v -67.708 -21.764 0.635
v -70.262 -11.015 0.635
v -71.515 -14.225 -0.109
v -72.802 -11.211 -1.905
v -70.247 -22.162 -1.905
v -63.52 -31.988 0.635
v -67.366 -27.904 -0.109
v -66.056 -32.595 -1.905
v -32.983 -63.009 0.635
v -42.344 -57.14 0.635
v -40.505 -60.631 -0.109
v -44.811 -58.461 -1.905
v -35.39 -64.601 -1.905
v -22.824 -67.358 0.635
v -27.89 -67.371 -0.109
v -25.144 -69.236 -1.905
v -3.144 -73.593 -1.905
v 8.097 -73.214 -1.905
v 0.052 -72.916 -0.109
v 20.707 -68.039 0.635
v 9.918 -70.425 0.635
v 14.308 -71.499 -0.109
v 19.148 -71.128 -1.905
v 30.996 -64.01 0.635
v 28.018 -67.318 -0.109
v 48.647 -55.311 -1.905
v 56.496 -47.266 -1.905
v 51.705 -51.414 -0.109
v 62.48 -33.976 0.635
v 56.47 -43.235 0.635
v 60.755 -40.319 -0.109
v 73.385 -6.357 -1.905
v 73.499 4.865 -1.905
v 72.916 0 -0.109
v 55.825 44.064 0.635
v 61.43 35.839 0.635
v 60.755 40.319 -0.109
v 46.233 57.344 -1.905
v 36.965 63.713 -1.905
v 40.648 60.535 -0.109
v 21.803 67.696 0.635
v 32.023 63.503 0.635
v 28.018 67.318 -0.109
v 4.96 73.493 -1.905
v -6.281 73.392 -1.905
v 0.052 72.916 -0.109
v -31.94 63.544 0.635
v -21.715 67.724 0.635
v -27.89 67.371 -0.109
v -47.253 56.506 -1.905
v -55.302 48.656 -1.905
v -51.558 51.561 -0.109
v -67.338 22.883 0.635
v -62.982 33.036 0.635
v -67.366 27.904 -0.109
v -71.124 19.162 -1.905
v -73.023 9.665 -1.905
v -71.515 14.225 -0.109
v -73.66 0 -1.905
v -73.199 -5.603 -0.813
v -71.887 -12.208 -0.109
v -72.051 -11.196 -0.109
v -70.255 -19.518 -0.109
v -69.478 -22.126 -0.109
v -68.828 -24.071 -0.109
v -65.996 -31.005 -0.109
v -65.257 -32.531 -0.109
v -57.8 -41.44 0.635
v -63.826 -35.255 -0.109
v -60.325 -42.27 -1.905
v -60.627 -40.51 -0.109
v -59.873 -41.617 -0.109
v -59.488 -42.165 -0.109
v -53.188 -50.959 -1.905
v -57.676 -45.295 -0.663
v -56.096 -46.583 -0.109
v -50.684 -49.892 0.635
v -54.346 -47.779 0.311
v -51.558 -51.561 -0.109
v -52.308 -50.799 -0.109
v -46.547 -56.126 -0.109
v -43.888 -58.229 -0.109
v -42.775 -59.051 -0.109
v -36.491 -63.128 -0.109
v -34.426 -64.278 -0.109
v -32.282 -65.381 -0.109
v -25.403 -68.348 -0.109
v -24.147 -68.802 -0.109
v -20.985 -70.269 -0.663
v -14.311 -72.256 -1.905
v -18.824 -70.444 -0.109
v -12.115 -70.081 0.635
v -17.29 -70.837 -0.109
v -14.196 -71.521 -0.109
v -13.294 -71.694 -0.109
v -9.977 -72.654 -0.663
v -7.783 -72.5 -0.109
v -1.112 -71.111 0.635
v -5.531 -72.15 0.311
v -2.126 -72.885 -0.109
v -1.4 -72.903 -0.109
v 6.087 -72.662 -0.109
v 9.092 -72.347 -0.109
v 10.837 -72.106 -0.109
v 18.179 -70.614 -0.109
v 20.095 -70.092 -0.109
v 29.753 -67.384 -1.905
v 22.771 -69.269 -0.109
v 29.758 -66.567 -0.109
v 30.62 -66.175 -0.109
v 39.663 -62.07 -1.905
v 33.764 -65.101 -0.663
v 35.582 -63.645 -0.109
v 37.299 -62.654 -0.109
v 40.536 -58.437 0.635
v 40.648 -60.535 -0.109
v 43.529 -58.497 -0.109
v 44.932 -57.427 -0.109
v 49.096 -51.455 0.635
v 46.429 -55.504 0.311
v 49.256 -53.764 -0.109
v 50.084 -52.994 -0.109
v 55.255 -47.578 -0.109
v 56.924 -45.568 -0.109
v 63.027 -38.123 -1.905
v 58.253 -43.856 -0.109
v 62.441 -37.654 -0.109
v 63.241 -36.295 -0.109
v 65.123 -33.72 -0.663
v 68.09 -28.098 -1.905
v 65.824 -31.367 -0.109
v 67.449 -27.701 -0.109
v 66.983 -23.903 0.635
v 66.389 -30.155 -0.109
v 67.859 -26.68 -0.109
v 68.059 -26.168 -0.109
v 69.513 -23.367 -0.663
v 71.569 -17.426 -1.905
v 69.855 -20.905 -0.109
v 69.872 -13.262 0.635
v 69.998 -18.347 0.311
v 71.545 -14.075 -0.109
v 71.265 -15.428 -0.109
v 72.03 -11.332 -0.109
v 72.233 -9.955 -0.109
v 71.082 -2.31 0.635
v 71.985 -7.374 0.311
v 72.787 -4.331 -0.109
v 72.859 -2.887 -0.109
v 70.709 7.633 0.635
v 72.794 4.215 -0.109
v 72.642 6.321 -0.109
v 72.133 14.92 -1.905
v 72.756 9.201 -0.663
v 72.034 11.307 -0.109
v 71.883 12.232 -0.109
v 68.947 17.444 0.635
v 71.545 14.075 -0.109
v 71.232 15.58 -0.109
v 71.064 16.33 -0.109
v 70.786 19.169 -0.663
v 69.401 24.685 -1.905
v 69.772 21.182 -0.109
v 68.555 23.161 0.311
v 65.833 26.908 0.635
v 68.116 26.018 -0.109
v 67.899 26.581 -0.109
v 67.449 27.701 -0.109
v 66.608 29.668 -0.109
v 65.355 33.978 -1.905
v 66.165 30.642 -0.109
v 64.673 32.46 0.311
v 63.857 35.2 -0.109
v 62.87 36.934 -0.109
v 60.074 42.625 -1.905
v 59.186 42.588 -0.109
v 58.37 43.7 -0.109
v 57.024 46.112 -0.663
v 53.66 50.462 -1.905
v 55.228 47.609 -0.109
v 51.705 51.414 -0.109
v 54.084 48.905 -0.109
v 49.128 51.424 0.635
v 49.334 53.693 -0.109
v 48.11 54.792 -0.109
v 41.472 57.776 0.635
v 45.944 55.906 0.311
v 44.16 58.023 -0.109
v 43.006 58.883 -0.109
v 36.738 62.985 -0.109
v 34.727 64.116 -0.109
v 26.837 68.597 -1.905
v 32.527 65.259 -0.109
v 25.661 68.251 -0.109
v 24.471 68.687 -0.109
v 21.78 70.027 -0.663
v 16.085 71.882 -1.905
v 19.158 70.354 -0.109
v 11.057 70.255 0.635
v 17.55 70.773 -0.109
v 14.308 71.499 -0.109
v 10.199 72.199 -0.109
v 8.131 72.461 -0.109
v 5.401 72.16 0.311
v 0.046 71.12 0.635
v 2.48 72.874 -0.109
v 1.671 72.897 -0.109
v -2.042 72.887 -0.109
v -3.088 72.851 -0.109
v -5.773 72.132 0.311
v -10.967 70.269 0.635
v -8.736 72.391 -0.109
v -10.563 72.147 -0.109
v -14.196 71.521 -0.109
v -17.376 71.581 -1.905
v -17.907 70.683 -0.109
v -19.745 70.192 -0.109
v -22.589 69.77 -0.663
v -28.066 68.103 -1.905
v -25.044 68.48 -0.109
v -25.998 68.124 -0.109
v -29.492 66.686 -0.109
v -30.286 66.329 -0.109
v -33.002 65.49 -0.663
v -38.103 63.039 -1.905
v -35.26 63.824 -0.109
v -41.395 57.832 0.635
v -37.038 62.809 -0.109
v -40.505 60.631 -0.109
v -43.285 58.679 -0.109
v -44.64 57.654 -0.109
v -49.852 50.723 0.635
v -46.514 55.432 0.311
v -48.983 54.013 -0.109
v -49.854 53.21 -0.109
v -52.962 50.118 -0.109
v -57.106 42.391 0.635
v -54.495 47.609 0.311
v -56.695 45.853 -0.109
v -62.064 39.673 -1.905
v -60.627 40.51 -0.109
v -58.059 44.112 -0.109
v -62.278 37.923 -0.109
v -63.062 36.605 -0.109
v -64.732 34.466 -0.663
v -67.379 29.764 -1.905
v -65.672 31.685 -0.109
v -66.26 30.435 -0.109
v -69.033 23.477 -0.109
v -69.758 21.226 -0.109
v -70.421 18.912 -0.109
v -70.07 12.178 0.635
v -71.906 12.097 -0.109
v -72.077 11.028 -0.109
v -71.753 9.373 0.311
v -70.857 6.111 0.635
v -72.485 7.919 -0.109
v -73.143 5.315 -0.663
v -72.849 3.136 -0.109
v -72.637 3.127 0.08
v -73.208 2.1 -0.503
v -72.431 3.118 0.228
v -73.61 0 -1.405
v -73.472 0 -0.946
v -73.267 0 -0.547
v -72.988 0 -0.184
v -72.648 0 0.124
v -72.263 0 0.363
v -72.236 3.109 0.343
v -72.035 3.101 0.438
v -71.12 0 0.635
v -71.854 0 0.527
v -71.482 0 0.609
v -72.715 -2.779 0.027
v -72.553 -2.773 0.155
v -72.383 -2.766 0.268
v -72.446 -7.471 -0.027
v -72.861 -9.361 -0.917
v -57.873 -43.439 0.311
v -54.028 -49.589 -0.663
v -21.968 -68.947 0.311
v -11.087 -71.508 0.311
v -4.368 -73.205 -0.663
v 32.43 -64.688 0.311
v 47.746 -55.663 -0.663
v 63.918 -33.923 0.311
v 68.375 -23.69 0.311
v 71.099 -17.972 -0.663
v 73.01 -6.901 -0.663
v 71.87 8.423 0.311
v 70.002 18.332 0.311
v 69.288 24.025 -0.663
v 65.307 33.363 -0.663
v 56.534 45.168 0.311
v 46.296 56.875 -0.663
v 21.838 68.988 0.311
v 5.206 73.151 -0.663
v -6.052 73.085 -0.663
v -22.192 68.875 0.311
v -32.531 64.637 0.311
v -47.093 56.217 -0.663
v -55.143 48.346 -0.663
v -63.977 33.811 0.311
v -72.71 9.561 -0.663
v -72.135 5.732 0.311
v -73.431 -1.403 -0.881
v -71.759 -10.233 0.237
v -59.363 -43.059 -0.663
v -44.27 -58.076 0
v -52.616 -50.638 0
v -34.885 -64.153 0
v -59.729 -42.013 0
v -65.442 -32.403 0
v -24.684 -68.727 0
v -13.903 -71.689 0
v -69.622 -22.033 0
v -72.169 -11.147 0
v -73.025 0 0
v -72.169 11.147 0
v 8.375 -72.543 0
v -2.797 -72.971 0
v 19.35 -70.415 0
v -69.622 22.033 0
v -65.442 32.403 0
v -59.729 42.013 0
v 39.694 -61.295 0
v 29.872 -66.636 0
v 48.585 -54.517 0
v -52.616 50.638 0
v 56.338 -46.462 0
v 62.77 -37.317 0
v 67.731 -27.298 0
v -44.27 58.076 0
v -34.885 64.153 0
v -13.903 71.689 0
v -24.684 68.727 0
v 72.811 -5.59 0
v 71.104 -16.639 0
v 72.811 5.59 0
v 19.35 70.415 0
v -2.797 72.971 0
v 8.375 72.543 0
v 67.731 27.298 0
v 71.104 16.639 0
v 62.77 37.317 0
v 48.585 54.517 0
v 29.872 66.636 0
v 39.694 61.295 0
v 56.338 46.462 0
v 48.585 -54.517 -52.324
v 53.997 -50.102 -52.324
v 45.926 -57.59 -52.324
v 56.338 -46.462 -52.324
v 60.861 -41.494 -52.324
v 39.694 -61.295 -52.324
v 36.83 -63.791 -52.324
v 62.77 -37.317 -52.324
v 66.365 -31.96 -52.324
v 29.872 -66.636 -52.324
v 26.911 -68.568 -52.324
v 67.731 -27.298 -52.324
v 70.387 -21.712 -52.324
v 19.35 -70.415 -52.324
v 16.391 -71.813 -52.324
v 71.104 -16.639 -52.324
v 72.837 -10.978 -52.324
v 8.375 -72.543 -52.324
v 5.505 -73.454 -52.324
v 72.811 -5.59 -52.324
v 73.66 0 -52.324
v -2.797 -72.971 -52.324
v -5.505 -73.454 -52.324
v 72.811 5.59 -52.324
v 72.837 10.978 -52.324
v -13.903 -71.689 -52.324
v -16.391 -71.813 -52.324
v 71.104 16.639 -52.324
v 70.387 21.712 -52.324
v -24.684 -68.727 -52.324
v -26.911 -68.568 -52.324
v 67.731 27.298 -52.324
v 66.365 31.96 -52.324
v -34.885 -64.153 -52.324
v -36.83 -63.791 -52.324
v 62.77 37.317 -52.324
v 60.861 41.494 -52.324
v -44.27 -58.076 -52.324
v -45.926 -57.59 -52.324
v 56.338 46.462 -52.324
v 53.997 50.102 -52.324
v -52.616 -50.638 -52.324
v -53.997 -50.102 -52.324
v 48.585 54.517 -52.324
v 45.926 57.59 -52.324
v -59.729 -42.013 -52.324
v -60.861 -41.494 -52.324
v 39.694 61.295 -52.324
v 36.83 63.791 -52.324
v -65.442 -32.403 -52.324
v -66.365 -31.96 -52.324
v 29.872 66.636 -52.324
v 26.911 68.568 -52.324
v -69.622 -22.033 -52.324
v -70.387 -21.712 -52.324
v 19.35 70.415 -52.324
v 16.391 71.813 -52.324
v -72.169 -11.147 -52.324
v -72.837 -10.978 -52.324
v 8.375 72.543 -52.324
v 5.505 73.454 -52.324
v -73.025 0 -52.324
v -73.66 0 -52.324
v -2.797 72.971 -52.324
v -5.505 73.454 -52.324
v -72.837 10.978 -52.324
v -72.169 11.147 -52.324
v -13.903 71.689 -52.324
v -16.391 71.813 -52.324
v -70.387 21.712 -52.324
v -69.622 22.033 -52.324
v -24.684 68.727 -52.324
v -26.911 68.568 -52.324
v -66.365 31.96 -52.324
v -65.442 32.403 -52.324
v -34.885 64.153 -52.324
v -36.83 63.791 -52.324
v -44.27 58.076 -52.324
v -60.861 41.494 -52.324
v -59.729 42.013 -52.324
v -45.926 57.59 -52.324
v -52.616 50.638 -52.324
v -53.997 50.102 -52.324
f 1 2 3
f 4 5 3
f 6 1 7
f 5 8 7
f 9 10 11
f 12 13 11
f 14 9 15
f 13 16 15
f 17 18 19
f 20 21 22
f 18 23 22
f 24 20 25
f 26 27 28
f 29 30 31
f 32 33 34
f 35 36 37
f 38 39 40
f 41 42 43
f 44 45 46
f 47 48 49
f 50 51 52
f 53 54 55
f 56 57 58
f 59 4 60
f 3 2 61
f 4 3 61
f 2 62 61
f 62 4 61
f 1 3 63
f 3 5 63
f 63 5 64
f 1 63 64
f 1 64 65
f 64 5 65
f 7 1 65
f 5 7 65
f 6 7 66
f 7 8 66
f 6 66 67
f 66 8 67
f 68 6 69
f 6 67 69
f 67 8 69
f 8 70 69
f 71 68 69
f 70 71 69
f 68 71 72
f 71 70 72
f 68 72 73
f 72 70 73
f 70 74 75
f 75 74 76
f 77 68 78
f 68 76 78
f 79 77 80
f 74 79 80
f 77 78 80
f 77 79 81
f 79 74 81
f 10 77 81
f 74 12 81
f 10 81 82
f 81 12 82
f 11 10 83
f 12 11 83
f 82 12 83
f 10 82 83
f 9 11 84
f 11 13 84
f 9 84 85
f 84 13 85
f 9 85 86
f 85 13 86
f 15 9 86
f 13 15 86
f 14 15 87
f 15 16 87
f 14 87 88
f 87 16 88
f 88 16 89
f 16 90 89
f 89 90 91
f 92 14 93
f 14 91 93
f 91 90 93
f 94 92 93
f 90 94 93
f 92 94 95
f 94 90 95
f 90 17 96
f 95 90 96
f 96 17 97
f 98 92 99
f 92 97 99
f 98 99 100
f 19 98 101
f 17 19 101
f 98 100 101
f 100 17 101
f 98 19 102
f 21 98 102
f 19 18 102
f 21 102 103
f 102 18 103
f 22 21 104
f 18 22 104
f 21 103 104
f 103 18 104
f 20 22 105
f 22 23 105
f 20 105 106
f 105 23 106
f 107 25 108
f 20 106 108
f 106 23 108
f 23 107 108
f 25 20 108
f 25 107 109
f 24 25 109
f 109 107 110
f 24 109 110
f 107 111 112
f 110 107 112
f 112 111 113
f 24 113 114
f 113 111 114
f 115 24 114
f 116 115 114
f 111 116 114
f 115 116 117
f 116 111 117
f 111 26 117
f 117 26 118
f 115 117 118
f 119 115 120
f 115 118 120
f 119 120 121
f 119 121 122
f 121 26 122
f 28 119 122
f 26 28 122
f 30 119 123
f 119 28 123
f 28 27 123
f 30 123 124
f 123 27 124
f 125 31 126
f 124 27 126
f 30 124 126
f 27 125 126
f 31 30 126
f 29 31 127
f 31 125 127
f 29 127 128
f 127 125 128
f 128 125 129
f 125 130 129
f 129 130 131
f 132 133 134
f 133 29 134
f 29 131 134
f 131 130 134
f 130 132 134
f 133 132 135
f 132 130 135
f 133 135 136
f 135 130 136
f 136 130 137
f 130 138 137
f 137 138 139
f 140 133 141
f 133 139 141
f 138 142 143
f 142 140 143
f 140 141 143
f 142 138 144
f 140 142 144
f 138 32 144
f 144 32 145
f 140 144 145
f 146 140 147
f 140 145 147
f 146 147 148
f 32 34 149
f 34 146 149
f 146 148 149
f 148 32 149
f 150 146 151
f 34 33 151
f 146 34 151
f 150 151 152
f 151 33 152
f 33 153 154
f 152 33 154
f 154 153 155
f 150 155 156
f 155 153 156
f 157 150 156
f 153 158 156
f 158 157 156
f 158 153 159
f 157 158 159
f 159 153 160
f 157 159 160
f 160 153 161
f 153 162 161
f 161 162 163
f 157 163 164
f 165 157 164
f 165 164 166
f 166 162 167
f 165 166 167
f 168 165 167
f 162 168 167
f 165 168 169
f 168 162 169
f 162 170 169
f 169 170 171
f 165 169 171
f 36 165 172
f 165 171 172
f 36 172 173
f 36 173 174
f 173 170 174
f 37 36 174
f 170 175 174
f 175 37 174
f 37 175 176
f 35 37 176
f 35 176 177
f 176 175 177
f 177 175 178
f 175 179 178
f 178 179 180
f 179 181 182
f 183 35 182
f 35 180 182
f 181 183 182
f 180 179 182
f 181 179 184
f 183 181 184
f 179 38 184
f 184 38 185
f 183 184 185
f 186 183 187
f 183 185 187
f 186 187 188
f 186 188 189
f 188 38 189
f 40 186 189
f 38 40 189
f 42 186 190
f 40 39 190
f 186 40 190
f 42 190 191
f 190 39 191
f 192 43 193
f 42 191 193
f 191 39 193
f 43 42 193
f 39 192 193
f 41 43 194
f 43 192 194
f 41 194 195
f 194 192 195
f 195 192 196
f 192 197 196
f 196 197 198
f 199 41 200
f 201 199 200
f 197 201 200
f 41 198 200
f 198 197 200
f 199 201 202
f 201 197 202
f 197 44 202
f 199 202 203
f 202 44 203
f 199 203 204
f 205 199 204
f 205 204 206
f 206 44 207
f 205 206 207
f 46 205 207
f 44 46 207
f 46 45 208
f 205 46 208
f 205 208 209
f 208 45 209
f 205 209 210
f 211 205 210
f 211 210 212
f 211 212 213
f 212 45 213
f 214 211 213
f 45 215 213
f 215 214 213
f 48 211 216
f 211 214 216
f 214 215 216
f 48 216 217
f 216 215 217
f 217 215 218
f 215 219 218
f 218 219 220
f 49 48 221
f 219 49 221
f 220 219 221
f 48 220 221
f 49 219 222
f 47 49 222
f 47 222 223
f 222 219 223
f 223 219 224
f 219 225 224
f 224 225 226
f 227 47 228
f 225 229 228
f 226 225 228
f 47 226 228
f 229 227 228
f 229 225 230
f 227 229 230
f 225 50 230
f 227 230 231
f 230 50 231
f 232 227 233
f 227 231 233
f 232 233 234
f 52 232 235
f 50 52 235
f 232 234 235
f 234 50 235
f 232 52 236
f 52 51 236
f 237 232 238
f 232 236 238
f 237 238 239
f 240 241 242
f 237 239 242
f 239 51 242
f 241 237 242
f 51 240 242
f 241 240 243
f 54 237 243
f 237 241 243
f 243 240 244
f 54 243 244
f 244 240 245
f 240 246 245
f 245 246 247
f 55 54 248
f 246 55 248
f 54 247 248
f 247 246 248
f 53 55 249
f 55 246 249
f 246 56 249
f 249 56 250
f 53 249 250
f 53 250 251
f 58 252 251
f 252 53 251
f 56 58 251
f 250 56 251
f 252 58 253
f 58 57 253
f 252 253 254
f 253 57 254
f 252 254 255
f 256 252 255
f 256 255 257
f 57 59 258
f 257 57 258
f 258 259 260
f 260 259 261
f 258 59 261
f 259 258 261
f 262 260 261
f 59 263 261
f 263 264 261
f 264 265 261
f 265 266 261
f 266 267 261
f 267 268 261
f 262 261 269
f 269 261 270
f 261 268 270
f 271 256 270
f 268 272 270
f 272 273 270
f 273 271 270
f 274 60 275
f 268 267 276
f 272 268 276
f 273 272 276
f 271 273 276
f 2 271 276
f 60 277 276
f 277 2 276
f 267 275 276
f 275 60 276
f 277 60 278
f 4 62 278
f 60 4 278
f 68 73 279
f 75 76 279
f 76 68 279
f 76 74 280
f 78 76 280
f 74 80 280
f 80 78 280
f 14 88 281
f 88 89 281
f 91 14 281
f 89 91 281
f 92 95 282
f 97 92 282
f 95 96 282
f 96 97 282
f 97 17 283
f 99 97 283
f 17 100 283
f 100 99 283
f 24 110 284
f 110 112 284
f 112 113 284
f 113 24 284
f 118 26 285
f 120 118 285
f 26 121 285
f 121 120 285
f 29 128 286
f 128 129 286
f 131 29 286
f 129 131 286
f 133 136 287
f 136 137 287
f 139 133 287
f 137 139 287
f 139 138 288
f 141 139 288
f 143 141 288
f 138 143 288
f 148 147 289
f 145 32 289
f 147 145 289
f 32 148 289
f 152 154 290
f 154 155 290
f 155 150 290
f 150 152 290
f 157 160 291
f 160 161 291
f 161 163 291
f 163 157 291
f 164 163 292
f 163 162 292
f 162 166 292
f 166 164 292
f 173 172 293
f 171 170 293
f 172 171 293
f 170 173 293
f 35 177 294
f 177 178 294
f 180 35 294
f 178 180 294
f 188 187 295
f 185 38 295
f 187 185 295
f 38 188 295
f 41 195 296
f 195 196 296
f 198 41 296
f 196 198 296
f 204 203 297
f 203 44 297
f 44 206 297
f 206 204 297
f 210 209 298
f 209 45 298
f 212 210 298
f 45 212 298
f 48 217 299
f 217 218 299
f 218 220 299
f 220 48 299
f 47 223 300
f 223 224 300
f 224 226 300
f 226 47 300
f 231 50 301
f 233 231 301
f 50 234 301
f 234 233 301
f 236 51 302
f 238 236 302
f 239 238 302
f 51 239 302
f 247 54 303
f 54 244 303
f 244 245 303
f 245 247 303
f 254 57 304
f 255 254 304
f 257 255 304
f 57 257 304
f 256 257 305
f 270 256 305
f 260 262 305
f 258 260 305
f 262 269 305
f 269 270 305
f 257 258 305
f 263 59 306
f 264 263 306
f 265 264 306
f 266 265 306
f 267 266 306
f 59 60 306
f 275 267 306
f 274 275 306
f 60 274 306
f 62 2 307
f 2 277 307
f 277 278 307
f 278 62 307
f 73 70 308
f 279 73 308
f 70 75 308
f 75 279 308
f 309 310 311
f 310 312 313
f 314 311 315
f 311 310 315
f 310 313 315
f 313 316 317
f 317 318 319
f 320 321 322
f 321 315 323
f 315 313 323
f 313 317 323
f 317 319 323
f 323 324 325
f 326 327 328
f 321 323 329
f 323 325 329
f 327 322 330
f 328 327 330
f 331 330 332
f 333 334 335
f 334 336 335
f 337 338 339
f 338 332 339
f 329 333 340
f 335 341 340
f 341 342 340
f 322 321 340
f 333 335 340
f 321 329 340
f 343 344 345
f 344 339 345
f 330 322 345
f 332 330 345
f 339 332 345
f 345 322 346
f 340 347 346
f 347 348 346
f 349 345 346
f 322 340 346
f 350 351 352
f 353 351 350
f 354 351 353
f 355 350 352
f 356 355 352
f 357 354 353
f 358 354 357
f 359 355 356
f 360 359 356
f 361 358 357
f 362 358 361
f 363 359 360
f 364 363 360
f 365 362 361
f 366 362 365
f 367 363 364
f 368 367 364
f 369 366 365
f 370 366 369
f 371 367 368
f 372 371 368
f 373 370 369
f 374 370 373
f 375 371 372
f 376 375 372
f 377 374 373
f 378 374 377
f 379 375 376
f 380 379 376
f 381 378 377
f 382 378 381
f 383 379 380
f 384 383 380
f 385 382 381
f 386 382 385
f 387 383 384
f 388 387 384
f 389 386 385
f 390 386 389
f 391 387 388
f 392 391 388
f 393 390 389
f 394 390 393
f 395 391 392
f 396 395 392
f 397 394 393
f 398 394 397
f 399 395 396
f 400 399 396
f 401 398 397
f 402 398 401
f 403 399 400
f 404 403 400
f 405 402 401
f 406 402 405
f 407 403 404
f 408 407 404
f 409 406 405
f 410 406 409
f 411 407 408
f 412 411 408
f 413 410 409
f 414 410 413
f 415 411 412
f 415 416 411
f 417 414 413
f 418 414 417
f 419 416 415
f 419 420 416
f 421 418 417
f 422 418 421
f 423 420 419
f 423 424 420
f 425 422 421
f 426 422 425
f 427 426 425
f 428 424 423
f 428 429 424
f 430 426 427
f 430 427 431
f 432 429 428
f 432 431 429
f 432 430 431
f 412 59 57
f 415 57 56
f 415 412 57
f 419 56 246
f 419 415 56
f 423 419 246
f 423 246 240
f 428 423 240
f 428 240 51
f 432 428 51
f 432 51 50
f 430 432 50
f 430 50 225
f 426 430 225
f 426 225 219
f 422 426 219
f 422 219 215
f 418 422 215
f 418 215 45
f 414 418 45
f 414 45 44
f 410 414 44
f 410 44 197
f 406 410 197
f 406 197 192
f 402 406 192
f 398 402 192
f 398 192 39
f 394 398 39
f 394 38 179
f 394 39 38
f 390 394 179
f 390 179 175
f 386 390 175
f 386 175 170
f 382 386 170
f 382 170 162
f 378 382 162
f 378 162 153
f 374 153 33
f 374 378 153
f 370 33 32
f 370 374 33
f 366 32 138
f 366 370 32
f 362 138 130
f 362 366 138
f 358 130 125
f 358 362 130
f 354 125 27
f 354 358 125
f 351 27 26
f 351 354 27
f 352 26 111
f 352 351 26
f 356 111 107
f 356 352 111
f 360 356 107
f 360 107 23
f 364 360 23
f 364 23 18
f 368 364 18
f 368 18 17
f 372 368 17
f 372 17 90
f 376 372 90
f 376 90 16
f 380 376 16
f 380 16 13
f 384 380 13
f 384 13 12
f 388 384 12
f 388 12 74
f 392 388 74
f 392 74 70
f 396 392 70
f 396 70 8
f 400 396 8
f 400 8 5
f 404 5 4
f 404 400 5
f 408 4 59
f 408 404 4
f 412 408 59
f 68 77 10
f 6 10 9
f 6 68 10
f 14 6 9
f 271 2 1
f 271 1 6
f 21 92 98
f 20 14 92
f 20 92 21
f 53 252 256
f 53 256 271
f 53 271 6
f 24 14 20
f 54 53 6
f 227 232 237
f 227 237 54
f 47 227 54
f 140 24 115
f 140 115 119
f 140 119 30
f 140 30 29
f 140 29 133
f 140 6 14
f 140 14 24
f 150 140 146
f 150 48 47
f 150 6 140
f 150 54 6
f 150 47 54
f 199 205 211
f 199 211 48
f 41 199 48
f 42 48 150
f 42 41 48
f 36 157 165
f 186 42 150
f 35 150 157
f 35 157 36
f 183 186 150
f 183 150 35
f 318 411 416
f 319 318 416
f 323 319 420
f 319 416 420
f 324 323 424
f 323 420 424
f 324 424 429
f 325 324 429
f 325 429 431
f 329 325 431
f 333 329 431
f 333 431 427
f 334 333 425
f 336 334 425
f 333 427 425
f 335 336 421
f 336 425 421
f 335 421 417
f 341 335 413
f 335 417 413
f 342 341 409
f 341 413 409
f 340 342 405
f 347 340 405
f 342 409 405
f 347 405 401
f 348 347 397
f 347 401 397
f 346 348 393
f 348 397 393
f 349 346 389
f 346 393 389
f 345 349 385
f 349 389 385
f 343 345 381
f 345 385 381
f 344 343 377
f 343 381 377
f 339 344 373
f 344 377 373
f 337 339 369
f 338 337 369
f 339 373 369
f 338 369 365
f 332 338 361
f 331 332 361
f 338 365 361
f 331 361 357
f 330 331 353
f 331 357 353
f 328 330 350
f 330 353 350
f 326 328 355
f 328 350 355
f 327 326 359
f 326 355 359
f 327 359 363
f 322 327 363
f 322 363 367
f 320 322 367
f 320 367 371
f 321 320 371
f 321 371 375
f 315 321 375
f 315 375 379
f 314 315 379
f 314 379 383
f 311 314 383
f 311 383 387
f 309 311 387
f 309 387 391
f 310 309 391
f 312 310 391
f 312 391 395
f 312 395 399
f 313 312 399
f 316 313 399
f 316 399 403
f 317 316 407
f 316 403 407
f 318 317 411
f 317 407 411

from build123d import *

# Parameters (mm, degrees)
SKETCH1_R           = 73.66
BOSS_EXTRUDE1_DEPTH = 0.635
BOSS_EXTRUDE2_START = 52.324
SKETCH2_R           = 73.66
SKETCH2_R_2         = 73.025
BOSS_EXTRUDE2_DEPTH = 52.324
FILLET1_R           = 2.54


with BuildPart() as part:
    # Sketch1 → Boss-Extrude1 (new body)
    with BuildSketch(Plane.XY):
        Circle(SKETCH1_R)
    extrude(amount=BOSS_EXTRUDE1_DEPTH)

    # Sketch2 → Boss-Extrude2 (add)
    with BuildSketch(Plane(origin=(0, 0, 0), x_dir=(-1, 0, 0), z_dir=(0, 0, -1)).offset(BOSS_EXTRUDE2_START)):
        Circle(SKETCH2_R)
        Circle(SKETCH2_R_2, mode=Mode.SUBTRACT)
    extrude(amount=-BOSS_EXTRUDE2_DEPTH)

    # Fillet1
    fillet1_edges = [part.edges().sort_by_distance(p)[0] for p in [
        (-73.66, 0, 0.635),
    ]]
    fillet(fillet1_edges, radius=FILLET1_R)


solid = part.part
